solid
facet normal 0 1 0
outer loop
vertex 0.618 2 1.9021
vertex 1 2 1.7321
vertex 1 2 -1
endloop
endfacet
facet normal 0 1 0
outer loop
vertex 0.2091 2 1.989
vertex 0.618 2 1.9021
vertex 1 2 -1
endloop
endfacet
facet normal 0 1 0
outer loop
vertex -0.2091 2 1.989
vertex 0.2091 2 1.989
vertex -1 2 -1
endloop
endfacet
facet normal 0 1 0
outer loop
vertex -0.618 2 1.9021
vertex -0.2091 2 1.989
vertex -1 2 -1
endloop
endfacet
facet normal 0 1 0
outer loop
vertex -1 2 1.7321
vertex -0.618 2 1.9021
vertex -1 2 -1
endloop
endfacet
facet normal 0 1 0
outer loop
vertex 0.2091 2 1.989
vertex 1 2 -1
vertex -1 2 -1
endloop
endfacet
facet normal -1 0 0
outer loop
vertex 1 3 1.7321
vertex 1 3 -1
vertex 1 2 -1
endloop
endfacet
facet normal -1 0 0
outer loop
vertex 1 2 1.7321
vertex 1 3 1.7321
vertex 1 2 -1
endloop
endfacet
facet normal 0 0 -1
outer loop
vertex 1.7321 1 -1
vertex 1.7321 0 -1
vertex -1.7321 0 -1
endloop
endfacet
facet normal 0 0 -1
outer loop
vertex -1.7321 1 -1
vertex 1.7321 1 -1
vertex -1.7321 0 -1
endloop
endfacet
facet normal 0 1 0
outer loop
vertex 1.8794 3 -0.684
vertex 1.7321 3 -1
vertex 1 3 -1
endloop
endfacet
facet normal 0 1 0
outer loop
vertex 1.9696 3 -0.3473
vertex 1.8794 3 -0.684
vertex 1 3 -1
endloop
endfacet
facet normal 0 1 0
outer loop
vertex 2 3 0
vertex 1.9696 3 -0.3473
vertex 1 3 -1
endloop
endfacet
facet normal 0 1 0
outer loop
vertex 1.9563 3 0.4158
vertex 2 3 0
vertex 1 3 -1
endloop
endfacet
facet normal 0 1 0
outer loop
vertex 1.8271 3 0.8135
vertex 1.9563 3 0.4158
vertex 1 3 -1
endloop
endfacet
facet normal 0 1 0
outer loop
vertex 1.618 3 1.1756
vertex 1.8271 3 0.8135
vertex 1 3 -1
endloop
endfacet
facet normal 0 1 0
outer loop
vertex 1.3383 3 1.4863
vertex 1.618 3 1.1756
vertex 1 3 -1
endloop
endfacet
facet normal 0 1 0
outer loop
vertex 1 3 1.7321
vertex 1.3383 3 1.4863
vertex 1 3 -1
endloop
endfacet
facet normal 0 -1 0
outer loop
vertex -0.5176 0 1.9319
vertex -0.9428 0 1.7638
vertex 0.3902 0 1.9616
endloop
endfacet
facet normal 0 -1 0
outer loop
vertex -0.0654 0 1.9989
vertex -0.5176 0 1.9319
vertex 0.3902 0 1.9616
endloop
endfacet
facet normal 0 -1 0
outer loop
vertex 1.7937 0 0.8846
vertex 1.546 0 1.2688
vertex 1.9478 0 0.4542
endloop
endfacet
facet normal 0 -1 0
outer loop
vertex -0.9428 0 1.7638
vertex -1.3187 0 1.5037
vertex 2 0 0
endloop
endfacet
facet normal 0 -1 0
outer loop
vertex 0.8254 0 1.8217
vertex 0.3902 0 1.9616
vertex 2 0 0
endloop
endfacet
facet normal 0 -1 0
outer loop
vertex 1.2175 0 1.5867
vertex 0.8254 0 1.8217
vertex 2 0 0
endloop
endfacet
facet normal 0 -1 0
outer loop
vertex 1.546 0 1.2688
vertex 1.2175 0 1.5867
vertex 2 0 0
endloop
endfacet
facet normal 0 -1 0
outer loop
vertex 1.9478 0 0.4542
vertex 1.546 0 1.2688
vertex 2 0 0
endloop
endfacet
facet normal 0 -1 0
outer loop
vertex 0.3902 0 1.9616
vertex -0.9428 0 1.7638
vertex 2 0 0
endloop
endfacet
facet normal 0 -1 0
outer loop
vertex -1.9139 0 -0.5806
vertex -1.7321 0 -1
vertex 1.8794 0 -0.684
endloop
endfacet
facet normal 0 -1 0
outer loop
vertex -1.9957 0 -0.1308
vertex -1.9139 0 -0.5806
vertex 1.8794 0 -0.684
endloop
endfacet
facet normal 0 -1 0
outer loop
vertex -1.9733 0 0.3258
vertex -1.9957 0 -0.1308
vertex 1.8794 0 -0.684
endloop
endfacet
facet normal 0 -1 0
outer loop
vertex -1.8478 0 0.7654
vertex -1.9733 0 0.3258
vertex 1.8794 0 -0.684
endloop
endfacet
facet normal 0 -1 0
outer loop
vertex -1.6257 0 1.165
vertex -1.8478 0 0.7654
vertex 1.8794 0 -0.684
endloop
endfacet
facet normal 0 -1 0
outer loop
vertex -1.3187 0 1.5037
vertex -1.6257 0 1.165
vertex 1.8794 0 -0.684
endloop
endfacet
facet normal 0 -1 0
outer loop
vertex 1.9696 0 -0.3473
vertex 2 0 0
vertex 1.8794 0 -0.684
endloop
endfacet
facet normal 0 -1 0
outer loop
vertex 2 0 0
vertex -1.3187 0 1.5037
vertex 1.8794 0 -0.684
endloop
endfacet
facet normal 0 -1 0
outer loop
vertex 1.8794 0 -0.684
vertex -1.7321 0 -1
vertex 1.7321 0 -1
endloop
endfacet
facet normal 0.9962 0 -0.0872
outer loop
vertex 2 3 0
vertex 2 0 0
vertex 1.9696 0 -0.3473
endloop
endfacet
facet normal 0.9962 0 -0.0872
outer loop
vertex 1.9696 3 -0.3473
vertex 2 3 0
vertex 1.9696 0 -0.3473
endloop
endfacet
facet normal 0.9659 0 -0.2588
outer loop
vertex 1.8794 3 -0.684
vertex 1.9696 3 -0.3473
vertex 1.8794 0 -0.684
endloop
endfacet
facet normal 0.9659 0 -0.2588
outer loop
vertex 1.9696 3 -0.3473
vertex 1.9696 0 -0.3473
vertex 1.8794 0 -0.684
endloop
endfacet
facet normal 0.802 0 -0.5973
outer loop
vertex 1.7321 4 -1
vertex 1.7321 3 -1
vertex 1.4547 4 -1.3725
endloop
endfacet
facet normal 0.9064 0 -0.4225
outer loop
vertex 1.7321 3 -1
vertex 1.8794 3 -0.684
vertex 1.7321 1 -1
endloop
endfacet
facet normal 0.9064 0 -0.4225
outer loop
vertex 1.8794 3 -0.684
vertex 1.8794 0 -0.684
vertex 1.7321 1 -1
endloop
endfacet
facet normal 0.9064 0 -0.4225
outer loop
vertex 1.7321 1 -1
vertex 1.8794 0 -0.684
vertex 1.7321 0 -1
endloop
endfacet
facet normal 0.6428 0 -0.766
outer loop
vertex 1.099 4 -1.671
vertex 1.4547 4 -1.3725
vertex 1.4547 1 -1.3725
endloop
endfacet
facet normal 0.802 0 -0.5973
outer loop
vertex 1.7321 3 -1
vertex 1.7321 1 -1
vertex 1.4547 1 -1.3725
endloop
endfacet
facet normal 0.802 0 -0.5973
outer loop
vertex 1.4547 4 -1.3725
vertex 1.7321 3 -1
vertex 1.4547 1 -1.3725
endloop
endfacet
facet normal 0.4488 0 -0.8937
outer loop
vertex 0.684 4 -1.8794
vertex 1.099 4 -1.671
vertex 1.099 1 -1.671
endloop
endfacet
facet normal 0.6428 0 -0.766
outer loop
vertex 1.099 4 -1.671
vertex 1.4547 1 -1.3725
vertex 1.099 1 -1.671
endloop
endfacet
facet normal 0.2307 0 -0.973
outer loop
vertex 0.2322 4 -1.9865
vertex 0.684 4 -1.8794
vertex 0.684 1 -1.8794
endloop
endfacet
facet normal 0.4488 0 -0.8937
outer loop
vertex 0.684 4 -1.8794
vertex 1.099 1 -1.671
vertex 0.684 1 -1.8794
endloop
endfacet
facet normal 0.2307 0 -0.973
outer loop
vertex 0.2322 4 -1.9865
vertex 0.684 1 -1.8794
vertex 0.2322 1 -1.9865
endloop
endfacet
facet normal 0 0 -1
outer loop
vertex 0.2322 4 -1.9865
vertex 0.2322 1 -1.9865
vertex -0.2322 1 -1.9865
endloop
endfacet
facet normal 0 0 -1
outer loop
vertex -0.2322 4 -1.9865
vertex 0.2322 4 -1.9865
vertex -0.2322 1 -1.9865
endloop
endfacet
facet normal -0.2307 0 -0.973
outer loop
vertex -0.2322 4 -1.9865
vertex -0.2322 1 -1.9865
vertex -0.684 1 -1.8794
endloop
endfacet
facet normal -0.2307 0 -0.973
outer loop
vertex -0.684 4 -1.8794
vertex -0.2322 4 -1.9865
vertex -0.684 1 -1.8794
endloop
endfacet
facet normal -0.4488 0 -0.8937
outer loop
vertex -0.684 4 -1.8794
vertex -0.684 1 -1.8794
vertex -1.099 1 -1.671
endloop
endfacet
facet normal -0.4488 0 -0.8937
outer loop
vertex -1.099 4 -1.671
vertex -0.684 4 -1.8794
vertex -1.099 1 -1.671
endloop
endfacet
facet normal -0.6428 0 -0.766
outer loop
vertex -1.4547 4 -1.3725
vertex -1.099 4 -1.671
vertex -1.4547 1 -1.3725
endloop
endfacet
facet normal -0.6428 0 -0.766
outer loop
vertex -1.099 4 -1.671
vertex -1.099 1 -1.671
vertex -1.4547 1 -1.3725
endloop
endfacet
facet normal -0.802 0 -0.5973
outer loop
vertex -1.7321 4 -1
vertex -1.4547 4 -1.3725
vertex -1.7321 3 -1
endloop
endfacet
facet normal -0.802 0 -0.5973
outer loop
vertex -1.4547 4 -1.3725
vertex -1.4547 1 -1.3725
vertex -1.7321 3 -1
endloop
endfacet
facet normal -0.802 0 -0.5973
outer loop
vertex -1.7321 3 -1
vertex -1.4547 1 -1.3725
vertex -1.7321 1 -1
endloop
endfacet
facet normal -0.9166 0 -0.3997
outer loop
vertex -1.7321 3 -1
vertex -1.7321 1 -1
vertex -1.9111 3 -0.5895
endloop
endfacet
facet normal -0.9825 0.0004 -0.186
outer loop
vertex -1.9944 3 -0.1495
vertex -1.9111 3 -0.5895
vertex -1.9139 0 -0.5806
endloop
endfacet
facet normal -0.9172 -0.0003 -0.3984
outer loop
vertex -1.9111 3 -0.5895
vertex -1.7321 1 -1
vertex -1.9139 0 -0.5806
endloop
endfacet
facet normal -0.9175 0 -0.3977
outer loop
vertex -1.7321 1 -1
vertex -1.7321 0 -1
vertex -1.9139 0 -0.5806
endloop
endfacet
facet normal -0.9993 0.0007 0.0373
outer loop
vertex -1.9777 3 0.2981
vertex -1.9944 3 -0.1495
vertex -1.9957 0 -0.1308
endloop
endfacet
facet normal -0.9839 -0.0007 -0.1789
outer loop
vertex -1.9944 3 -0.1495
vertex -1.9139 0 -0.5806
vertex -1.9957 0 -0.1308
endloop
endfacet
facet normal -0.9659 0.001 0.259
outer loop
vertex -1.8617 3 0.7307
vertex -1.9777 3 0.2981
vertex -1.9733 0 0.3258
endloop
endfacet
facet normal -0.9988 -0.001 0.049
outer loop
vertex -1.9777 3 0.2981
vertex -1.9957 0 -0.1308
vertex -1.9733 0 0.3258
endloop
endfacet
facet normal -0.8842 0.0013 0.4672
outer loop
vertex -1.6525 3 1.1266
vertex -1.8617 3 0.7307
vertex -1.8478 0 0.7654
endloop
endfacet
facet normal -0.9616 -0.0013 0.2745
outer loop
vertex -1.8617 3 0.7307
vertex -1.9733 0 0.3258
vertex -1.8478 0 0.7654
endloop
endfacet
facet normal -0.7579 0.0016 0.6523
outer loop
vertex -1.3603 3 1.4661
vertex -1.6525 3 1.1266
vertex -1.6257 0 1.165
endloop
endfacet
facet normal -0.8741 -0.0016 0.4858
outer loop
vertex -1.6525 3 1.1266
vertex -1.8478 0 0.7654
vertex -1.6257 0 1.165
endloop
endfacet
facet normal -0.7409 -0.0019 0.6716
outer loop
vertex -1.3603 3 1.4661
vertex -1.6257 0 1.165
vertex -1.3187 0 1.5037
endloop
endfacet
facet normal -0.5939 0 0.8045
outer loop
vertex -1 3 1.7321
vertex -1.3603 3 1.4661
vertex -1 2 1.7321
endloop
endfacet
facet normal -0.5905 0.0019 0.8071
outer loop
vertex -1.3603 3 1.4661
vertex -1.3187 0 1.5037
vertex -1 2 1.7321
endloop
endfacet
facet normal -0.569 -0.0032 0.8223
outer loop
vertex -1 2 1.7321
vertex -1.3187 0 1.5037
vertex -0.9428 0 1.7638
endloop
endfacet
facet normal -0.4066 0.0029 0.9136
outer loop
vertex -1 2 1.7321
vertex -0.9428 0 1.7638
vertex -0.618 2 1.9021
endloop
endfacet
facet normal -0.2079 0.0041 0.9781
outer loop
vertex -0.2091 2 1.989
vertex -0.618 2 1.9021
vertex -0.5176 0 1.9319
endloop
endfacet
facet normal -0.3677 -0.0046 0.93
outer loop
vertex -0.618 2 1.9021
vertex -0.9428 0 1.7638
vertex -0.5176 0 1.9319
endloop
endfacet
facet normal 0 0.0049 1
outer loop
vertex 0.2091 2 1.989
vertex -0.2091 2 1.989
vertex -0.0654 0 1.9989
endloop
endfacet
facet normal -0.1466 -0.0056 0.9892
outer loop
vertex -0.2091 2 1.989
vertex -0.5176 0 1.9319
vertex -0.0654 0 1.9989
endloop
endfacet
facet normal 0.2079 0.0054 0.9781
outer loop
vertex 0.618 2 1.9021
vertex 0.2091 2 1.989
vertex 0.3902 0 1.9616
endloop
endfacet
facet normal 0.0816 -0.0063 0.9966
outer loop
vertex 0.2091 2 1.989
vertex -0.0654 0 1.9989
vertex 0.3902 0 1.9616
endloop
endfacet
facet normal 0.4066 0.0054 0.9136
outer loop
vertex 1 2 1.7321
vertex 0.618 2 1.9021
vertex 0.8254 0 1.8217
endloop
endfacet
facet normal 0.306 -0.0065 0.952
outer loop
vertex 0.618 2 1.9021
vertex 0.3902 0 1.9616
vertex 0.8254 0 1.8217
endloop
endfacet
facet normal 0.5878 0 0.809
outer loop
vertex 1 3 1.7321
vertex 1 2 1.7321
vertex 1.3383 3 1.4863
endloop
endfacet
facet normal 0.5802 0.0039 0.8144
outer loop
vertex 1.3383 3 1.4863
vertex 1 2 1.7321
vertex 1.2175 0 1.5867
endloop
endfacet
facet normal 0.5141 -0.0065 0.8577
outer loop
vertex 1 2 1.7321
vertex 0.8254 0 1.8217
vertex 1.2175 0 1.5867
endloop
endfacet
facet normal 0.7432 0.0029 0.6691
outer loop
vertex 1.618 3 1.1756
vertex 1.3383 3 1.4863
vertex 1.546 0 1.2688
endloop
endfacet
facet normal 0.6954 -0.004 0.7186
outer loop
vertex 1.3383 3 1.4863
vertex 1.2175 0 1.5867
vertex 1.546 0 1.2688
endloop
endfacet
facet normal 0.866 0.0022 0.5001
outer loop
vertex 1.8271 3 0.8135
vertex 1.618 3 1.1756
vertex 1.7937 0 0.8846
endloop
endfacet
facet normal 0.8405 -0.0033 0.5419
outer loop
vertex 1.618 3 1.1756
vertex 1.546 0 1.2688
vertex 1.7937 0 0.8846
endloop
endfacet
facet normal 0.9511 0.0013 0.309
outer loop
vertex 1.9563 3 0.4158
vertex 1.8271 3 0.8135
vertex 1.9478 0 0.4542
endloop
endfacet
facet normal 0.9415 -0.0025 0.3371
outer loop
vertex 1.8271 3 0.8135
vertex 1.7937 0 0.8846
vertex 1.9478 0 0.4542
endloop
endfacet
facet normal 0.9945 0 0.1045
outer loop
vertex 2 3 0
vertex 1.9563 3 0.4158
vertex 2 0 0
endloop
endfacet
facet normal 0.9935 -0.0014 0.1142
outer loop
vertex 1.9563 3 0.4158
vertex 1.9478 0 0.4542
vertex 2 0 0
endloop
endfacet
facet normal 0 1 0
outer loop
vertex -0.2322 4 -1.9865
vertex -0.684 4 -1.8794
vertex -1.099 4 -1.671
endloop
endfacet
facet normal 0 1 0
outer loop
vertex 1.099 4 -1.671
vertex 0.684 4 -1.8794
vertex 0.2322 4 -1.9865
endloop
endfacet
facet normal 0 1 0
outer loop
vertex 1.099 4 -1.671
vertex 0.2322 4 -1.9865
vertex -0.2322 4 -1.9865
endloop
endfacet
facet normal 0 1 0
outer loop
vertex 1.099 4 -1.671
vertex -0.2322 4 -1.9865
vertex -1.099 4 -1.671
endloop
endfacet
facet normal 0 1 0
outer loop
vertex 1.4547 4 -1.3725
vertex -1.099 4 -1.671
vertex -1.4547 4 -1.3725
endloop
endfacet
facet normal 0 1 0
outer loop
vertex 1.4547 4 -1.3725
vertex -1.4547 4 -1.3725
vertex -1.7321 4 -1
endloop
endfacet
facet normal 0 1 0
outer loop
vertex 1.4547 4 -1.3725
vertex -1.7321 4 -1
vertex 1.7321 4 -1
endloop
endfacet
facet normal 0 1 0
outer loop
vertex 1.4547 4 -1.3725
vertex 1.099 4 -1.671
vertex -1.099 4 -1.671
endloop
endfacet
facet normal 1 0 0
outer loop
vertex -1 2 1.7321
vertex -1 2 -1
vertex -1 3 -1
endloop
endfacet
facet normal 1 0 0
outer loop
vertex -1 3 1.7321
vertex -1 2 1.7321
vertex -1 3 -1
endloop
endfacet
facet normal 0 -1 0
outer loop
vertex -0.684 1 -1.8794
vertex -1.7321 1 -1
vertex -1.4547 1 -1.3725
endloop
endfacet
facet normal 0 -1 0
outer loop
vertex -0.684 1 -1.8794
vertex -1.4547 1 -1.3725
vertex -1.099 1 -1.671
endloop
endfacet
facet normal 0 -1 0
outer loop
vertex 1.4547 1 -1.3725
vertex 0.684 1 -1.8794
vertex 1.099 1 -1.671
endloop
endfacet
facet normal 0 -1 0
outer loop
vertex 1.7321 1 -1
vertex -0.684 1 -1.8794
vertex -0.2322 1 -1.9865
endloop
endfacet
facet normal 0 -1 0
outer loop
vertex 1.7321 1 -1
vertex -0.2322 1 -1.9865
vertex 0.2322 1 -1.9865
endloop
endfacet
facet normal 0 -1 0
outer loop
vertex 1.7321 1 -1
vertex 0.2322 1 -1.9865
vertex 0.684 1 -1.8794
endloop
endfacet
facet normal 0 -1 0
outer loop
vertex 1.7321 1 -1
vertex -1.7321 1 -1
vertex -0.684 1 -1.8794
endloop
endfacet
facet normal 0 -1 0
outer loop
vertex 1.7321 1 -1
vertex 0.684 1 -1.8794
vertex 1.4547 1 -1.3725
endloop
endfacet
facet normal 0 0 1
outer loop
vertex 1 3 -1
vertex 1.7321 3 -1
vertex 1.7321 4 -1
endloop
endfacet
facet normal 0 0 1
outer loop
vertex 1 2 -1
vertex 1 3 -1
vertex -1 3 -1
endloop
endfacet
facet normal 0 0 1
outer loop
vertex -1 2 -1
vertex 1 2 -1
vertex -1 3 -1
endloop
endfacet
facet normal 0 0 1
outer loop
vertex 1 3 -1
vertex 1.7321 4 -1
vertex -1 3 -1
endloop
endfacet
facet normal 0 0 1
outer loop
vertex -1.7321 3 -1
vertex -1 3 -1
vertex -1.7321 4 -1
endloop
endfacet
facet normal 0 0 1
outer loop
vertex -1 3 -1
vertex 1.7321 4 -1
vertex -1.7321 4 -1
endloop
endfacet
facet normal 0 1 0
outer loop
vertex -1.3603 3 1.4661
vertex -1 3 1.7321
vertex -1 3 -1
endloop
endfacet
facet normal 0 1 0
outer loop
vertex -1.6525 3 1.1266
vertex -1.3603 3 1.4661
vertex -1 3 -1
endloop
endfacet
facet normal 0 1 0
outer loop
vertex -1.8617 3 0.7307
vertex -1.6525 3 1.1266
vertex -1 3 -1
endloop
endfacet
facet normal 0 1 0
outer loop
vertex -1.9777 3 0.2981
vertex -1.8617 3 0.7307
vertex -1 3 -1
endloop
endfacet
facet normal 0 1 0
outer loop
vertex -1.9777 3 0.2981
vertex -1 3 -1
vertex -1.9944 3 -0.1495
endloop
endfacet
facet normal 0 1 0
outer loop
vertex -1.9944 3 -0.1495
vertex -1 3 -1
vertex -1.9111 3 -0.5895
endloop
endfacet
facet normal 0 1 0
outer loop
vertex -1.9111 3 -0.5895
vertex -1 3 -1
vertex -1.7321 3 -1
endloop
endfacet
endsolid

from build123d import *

# Parameters (mm, degrees)
SKETCH1_R               = 2
BOSS_EXTRUDE1_DEPTH     = 4
CUT_EXTRUDE1_DEPTH      = 3
CUT_EXTRUDE1_DEPTH_BACK = 1
CUT_EXTRUDE3_DEPTH      = 1


with BuildPart() as part:
    # Sketch1 → Boss-Extrude1 (new body)
    with BuildSketch(Plane(origin=(0, 0, 0), x_dir=(1, 0, 0), z_dir=(0, 1, 0))):
        Circle(SKETCH1_R)
    extrude(amount=BOSS_EXTRUDE1_DEPTH)

    # Sketch2 → Cut-Extrude1 (cut, two sides)
    with BuildSketch(Plane.XY) as cut_extrude1_sk:
        Polygon((-2, 4), (2, 4), (2, 3), (1, 3), (1, 2), (-1, 2), (-1, 3), (-2, 3), align=None)
    extrude(amount=CUT_EXTRUDE1_DEPTH, mode=Mode.SUBTRACT)
    extrude(cut_extrude1_sk.sketch, amount=-CUT_EXTRUDE1_DEPTH_BACK, mode=Mode.SUBTRACT)

    # Sketch4 → Cut-Extrude3 (cut)
    with BuildSketch(Plane.XZ):
        with BuildLine():
            Line((1.732050808, -1), (-1.732050808, -1))
            ThreePointArc((-1.732050808, -1), (0, -2), (1.732050808, -1))
        make_face()
    extrude(amount=-CUT_EXTRUDE3_DEPTH, mode=Mode.SUBTRACT)


solid = part.part
